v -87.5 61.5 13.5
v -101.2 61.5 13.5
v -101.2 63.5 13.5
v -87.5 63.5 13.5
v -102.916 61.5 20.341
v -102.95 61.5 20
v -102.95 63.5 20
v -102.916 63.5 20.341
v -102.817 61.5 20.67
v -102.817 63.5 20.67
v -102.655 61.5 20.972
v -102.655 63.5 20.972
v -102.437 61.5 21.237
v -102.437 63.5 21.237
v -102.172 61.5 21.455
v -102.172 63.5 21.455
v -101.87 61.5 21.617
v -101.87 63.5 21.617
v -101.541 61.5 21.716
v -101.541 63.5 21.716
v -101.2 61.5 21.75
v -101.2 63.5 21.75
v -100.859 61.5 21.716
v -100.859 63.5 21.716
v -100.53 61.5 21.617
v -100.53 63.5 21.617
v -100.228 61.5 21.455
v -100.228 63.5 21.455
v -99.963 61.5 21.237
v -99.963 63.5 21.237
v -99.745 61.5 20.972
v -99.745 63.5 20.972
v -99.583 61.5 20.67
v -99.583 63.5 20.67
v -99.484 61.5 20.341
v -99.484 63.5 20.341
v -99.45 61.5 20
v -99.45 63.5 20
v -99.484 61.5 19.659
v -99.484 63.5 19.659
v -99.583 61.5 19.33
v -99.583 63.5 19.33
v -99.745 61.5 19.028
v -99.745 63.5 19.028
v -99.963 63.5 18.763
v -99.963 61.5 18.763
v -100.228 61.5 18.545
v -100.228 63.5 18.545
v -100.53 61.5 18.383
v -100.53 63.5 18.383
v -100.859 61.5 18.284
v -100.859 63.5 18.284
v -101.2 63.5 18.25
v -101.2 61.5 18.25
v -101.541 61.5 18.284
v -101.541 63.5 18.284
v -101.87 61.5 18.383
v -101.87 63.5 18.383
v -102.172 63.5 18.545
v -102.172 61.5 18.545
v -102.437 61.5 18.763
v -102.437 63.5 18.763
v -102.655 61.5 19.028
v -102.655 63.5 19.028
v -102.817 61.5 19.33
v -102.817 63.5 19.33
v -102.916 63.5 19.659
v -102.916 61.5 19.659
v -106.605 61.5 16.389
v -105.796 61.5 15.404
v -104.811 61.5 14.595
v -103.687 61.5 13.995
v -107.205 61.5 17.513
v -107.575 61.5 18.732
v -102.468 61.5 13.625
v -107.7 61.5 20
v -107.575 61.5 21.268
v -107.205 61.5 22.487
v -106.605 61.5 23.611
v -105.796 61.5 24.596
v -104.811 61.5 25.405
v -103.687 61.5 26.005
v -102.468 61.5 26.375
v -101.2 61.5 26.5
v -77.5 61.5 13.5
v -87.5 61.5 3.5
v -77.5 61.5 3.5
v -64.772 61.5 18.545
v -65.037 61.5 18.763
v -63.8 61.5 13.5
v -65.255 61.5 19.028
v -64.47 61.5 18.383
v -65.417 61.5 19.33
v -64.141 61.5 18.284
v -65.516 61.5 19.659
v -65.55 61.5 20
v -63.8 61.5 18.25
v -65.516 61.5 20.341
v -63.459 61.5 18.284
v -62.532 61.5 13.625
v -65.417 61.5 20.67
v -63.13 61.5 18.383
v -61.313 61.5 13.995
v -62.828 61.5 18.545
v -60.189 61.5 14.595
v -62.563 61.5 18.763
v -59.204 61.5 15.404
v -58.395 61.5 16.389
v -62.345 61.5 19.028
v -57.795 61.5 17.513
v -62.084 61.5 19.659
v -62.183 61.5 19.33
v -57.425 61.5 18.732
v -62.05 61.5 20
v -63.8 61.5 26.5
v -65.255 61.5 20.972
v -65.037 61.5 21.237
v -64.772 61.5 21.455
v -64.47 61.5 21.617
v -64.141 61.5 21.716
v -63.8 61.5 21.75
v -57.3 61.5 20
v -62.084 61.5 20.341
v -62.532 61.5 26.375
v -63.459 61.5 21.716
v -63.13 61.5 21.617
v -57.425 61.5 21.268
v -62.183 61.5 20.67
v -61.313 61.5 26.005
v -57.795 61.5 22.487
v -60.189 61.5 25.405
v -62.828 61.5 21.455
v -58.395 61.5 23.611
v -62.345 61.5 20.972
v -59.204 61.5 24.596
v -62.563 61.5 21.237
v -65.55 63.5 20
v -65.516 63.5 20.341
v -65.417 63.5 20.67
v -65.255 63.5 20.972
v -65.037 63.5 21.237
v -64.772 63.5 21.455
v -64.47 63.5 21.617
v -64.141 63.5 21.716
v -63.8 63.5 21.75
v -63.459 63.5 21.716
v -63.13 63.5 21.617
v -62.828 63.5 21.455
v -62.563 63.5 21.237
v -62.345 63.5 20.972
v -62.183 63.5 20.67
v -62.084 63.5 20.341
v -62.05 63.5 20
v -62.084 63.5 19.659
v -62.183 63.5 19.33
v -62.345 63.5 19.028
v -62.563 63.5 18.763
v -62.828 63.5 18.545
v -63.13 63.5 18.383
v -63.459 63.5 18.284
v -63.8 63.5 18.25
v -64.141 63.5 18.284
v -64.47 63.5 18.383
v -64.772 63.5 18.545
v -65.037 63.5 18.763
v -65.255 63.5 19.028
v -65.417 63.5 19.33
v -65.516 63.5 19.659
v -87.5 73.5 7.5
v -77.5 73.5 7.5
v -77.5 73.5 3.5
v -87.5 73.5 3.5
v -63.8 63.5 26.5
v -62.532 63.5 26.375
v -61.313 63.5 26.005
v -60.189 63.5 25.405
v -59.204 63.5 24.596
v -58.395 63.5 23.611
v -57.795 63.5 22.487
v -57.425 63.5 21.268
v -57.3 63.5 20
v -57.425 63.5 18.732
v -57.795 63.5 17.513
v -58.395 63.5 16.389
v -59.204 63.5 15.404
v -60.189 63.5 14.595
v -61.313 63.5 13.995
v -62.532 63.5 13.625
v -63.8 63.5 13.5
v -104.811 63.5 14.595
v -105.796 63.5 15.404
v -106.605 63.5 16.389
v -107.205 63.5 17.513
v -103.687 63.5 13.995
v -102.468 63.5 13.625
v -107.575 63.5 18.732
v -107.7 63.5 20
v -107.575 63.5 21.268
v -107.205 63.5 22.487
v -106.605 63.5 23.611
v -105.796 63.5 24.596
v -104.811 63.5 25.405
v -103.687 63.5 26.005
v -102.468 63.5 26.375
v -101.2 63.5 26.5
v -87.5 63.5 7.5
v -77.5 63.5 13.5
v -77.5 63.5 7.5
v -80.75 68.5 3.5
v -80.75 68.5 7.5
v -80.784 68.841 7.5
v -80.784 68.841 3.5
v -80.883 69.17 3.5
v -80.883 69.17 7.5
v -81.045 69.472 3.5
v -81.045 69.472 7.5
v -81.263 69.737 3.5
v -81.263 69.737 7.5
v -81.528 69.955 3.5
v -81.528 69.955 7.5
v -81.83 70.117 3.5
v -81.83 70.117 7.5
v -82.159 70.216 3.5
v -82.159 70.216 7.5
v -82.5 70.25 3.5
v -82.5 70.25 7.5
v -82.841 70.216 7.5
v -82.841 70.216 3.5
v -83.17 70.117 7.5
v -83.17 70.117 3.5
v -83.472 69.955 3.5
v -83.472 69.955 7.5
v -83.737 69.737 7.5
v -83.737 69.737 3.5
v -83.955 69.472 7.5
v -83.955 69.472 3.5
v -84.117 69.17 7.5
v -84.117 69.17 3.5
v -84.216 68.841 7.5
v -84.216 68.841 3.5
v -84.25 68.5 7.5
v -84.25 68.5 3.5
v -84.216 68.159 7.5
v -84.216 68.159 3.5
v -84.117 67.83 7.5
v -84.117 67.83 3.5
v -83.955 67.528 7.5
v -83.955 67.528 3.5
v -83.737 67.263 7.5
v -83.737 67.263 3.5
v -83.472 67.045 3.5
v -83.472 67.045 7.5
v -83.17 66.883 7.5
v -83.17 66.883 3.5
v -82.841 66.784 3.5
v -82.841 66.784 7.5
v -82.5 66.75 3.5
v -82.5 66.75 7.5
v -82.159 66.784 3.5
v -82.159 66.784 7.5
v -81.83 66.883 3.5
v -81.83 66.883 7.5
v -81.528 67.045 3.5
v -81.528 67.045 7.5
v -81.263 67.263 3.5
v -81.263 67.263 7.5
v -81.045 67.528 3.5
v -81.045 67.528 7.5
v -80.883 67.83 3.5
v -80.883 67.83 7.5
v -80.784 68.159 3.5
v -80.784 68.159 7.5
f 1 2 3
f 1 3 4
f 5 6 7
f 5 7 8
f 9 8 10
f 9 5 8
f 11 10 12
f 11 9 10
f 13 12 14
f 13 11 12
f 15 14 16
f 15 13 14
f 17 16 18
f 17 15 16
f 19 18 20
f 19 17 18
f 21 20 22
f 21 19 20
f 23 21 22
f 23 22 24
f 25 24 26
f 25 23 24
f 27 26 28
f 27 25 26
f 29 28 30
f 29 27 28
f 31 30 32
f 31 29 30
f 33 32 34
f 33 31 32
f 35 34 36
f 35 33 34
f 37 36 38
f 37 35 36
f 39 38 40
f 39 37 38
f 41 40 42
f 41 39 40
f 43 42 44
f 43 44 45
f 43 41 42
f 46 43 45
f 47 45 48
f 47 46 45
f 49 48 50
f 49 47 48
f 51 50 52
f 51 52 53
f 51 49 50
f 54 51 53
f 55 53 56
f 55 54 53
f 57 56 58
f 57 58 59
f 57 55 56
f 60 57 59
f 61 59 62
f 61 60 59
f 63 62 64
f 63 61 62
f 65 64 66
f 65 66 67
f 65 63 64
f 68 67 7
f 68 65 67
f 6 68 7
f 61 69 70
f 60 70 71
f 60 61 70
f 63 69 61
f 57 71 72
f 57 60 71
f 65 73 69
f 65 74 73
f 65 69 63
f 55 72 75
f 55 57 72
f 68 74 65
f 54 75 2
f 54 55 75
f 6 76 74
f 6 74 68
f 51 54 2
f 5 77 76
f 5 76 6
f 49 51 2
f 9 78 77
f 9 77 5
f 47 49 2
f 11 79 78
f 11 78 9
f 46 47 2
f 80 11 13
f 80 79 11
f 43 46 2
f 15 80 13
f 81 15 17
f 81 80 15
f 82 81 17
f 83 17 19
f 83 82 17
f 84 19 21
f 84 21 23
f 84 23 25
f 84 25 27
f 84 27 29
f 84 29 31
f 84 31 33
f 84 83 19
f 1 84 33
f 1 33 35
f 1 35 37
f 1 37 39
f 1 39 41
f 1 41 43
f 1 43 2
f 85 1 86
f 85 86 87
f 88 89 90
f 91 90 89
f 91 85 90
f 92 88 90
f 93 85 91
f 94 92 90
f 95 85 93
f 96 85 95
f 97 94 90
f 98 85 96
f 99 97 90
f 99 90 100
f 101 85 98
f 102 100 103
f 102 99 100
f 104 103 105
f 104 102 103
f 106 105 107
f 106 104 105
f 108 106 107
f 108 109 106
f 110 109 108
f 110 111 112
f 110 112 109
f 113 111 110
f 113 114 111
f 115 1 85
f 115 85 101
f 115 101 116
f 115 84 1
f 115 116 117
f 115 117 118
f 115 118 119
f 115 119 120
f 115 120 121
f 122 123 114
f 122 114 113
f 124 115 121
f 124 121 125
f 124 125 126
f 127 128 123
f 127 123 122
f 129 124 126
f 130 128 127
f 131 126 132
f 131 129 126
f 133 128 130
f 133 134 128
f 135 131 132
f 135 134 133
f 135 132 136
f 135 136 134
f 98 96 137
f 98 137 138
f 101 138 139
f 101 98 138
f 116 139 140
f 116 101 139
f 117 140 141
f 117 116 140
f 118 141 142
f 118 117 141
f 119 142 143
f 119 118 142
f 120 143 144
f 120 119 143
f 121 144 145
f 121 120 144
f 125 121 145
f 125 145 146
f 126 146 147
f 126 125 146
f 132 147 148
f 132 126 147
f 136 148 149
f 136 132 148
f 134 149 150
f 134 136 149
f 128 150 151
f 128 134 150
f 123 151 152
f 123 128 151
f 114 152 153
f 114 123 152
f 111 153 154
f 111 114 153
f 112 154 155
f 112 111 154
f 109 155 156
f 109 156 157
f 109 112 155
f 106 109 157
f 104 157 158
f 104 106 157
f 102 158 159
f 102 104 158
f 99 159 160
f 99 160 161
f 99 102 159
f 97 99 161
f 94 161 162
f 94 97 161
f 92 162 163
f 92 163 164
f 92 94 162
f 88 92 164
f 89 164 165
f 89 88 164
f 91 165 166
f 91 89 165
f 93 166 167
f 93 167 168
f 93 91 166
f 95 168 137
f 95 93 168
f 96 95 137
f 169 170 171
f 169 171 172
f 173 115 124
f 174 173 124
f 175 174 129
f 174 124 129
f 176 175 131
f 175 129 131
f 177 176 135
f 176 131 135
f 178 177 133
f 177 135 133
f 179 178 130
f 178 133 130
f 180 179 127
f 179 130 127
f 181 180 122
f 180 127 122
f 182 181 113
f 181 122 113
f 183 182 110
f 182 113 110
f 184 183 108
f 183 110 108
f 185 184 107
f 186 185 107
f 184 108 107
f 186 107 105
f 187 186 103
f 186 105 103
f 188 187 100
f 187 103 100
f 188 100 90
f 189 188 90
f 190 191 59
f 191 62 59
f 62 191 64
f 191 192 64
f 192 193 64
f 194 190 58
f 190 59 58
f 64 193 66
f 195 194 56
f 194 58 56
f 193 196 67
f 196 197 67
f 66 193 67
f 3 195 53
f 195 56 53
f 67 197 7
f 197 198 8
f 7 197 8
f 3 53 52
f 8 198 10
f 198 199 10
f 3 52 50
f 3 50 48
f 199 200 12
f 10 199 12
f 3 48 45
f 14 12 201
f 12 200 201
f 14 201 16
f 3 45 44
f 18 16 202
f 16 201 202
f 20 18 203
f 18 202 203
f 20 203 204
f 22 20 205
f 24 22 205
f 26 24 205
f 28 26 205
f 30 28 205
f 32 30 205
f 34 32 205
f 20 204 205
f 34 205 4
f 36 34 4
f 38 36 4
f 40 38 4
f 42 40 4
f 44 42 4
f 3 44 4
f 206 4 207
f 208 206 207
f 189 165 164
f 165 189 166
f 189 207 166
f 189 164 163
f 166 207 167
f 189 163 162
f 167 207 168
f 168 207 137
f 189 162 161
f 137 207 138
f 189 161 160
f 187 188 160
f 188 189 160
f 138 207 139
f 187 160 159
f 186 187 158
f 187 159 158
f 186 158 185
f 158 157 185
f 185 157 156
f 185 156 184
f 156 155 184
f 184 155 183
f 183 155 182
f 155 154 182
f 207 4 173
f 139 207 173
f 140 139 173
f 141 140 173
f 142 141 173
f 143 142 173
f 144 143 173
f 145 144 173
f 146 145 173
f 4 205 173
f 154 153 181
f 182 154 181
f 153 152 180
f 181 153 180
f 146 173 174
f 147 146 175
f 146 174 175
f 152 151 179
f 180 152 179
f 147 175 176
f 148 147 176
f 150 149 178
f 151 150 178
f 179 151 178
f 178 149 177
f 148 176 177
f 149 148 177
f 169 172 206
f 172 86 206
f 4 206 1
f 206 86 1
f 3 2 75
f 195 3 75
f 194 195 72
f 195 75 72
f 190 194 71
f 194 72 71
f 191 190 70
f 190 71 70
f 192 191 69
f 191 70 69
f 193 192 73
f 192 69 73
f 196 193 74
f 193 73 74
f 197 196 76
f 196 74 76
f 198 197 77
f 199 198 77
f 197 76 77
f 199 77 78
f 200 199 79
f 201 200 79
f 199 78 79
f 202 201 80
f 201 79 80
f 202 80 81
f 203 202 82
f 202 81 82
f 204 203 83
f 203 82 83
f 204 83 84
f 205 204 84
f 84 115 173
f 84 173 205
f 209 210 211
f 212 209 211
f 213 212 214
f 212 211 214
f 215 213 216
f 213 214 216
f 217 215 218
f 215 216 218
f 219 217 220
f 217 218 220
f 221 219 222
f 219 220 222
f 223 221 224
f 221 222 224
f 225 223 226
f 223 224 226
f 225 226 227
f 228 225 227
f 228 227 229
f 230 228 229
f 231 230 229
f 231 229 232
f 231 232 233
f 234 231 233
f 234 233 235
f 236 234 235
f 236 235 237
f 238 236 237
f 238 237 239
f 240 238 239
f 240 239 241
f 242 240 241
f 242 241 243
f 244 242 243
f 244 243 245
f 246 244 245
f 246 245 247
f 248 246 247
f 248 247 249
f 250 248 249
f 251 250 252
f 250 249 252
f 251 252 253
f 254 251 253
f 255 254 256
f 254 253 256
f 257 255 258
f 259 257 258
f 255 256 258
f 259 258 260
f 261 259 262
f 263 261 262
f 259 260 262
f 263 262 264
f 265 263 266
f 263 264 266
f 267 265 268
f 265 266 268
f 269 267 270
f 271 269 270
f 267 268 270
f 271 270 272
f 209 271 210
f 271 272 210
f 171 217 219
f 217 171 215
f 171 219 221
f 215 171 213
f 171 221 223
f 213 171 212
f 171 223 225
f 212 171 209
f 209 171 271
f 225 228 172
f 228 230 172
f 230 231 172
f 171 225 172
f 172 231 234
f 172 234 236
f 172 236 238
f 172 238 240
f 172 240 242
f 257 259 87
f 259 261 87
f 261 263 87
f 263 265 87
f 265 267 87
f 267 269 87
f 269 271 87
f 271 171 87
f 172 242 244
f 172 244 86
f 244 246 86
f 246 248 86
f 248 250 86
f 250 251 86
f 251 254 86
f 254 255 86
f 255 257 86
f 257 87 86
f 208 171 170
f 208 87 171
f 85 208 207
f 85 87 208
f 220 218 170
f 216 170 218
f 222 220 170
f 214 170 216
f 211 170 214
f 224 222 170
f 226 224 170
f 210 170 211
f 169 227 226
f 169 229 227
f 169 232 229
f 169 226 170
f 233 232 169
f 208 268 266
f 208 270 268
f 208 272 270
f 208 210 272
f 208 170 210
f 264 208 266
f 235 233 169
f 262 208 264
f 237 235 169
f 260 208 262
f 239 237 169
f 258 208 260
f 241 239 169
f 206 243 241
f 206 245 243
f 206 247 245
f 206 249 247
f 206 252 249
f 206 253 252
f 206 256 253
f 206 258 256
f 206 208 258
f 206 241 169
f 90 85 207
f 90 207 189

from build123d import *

# Parameters (mm, degrees)
SKETCH066_R             = 1.75
PAD046_DEPTH            = 2
SKETCH067_W             = 10
SKETCH067_H             = 2
PAD047_DEPTH            = 10
SKETCH068_W             = 10
SKETCH068_H             = 4
PAD048_DEPTH            = 10
SKETCH069_R             = 1.75
POCKET012_DEPTH         = 4.001
BODY015_PLACEMENT_ANGLE = 180


with BuildPart() as part:
    # Sketch066 → Pad046 (new body)
    with BuildSketch(Plane.XZ):
        with BuildLine():
            Line((-18.7, 6.5), (18.7, 6.5))
            ThreePointArc((18.7, -6.5), (25.2, 0), (18.7, 6.5))
            Line((18.7, -6.5), (-18.7, -6.5))
            ThreePointArc((-18.7, 6.5), (-25.2, 0), (-18.7, -6.5))
        make_face()
        with Locations((-18.7, 0)):
            Circle(SKETCH066_R, mode=Mode.SUBTRACT)
        with Locations((18.7, 0)):
            Circle(SKETCH066_R, mode=Mode.SUBTRACT)
    extrude(amount=PAD046_DEPTH)

    # Sketch067 (on Face1 of Pad046) → Pad047 (join)
    with BuildSketch(Plane(origin=(0, 0, -6.5), x_dir=(1, 0, 0), z_dir=(0, 0, -1))):
        with Locations((0, 1)):
            Rectangle(SKETCH067_W, SKETCH067_H)
    extrude(amount=PAD047_DEPTH)

    # Sketch068 (on Face12 of Pad047) → Pad048 (join)
    with BuildSketch(Plane.XZ.offset(2)):
        with Locations((0, -14.5)):
            Rectangle(SKETCH068_W, SKETCH068_H)
    extrude(amount=PAD048_DEPTH)

    # Sketch069 (on Face16 of Pad048) → Pocket012 (cut, through all)
    with BuildSketch(Plane(origin=(0, 0, -12.5), x_dir=(-1, 0, 0), z_dir=(0, 0, 1))):
        with Locations((0, 7)):
            Circle(SKETCH069_R)
    extrude(amount=-POCKET012_DEPTH, mode=Mode.SUBTRACT)


with BuildPart() as part_1:
    # Body015 placement: moved
    add(part.part.moved(Location((-82.5, 61.5, 20))).rotate(Axis((-82.5, 61.5, 20), (0, 0, 1)), BODY015_PLACEMENT_ANGLE))


solid = part_1.part
